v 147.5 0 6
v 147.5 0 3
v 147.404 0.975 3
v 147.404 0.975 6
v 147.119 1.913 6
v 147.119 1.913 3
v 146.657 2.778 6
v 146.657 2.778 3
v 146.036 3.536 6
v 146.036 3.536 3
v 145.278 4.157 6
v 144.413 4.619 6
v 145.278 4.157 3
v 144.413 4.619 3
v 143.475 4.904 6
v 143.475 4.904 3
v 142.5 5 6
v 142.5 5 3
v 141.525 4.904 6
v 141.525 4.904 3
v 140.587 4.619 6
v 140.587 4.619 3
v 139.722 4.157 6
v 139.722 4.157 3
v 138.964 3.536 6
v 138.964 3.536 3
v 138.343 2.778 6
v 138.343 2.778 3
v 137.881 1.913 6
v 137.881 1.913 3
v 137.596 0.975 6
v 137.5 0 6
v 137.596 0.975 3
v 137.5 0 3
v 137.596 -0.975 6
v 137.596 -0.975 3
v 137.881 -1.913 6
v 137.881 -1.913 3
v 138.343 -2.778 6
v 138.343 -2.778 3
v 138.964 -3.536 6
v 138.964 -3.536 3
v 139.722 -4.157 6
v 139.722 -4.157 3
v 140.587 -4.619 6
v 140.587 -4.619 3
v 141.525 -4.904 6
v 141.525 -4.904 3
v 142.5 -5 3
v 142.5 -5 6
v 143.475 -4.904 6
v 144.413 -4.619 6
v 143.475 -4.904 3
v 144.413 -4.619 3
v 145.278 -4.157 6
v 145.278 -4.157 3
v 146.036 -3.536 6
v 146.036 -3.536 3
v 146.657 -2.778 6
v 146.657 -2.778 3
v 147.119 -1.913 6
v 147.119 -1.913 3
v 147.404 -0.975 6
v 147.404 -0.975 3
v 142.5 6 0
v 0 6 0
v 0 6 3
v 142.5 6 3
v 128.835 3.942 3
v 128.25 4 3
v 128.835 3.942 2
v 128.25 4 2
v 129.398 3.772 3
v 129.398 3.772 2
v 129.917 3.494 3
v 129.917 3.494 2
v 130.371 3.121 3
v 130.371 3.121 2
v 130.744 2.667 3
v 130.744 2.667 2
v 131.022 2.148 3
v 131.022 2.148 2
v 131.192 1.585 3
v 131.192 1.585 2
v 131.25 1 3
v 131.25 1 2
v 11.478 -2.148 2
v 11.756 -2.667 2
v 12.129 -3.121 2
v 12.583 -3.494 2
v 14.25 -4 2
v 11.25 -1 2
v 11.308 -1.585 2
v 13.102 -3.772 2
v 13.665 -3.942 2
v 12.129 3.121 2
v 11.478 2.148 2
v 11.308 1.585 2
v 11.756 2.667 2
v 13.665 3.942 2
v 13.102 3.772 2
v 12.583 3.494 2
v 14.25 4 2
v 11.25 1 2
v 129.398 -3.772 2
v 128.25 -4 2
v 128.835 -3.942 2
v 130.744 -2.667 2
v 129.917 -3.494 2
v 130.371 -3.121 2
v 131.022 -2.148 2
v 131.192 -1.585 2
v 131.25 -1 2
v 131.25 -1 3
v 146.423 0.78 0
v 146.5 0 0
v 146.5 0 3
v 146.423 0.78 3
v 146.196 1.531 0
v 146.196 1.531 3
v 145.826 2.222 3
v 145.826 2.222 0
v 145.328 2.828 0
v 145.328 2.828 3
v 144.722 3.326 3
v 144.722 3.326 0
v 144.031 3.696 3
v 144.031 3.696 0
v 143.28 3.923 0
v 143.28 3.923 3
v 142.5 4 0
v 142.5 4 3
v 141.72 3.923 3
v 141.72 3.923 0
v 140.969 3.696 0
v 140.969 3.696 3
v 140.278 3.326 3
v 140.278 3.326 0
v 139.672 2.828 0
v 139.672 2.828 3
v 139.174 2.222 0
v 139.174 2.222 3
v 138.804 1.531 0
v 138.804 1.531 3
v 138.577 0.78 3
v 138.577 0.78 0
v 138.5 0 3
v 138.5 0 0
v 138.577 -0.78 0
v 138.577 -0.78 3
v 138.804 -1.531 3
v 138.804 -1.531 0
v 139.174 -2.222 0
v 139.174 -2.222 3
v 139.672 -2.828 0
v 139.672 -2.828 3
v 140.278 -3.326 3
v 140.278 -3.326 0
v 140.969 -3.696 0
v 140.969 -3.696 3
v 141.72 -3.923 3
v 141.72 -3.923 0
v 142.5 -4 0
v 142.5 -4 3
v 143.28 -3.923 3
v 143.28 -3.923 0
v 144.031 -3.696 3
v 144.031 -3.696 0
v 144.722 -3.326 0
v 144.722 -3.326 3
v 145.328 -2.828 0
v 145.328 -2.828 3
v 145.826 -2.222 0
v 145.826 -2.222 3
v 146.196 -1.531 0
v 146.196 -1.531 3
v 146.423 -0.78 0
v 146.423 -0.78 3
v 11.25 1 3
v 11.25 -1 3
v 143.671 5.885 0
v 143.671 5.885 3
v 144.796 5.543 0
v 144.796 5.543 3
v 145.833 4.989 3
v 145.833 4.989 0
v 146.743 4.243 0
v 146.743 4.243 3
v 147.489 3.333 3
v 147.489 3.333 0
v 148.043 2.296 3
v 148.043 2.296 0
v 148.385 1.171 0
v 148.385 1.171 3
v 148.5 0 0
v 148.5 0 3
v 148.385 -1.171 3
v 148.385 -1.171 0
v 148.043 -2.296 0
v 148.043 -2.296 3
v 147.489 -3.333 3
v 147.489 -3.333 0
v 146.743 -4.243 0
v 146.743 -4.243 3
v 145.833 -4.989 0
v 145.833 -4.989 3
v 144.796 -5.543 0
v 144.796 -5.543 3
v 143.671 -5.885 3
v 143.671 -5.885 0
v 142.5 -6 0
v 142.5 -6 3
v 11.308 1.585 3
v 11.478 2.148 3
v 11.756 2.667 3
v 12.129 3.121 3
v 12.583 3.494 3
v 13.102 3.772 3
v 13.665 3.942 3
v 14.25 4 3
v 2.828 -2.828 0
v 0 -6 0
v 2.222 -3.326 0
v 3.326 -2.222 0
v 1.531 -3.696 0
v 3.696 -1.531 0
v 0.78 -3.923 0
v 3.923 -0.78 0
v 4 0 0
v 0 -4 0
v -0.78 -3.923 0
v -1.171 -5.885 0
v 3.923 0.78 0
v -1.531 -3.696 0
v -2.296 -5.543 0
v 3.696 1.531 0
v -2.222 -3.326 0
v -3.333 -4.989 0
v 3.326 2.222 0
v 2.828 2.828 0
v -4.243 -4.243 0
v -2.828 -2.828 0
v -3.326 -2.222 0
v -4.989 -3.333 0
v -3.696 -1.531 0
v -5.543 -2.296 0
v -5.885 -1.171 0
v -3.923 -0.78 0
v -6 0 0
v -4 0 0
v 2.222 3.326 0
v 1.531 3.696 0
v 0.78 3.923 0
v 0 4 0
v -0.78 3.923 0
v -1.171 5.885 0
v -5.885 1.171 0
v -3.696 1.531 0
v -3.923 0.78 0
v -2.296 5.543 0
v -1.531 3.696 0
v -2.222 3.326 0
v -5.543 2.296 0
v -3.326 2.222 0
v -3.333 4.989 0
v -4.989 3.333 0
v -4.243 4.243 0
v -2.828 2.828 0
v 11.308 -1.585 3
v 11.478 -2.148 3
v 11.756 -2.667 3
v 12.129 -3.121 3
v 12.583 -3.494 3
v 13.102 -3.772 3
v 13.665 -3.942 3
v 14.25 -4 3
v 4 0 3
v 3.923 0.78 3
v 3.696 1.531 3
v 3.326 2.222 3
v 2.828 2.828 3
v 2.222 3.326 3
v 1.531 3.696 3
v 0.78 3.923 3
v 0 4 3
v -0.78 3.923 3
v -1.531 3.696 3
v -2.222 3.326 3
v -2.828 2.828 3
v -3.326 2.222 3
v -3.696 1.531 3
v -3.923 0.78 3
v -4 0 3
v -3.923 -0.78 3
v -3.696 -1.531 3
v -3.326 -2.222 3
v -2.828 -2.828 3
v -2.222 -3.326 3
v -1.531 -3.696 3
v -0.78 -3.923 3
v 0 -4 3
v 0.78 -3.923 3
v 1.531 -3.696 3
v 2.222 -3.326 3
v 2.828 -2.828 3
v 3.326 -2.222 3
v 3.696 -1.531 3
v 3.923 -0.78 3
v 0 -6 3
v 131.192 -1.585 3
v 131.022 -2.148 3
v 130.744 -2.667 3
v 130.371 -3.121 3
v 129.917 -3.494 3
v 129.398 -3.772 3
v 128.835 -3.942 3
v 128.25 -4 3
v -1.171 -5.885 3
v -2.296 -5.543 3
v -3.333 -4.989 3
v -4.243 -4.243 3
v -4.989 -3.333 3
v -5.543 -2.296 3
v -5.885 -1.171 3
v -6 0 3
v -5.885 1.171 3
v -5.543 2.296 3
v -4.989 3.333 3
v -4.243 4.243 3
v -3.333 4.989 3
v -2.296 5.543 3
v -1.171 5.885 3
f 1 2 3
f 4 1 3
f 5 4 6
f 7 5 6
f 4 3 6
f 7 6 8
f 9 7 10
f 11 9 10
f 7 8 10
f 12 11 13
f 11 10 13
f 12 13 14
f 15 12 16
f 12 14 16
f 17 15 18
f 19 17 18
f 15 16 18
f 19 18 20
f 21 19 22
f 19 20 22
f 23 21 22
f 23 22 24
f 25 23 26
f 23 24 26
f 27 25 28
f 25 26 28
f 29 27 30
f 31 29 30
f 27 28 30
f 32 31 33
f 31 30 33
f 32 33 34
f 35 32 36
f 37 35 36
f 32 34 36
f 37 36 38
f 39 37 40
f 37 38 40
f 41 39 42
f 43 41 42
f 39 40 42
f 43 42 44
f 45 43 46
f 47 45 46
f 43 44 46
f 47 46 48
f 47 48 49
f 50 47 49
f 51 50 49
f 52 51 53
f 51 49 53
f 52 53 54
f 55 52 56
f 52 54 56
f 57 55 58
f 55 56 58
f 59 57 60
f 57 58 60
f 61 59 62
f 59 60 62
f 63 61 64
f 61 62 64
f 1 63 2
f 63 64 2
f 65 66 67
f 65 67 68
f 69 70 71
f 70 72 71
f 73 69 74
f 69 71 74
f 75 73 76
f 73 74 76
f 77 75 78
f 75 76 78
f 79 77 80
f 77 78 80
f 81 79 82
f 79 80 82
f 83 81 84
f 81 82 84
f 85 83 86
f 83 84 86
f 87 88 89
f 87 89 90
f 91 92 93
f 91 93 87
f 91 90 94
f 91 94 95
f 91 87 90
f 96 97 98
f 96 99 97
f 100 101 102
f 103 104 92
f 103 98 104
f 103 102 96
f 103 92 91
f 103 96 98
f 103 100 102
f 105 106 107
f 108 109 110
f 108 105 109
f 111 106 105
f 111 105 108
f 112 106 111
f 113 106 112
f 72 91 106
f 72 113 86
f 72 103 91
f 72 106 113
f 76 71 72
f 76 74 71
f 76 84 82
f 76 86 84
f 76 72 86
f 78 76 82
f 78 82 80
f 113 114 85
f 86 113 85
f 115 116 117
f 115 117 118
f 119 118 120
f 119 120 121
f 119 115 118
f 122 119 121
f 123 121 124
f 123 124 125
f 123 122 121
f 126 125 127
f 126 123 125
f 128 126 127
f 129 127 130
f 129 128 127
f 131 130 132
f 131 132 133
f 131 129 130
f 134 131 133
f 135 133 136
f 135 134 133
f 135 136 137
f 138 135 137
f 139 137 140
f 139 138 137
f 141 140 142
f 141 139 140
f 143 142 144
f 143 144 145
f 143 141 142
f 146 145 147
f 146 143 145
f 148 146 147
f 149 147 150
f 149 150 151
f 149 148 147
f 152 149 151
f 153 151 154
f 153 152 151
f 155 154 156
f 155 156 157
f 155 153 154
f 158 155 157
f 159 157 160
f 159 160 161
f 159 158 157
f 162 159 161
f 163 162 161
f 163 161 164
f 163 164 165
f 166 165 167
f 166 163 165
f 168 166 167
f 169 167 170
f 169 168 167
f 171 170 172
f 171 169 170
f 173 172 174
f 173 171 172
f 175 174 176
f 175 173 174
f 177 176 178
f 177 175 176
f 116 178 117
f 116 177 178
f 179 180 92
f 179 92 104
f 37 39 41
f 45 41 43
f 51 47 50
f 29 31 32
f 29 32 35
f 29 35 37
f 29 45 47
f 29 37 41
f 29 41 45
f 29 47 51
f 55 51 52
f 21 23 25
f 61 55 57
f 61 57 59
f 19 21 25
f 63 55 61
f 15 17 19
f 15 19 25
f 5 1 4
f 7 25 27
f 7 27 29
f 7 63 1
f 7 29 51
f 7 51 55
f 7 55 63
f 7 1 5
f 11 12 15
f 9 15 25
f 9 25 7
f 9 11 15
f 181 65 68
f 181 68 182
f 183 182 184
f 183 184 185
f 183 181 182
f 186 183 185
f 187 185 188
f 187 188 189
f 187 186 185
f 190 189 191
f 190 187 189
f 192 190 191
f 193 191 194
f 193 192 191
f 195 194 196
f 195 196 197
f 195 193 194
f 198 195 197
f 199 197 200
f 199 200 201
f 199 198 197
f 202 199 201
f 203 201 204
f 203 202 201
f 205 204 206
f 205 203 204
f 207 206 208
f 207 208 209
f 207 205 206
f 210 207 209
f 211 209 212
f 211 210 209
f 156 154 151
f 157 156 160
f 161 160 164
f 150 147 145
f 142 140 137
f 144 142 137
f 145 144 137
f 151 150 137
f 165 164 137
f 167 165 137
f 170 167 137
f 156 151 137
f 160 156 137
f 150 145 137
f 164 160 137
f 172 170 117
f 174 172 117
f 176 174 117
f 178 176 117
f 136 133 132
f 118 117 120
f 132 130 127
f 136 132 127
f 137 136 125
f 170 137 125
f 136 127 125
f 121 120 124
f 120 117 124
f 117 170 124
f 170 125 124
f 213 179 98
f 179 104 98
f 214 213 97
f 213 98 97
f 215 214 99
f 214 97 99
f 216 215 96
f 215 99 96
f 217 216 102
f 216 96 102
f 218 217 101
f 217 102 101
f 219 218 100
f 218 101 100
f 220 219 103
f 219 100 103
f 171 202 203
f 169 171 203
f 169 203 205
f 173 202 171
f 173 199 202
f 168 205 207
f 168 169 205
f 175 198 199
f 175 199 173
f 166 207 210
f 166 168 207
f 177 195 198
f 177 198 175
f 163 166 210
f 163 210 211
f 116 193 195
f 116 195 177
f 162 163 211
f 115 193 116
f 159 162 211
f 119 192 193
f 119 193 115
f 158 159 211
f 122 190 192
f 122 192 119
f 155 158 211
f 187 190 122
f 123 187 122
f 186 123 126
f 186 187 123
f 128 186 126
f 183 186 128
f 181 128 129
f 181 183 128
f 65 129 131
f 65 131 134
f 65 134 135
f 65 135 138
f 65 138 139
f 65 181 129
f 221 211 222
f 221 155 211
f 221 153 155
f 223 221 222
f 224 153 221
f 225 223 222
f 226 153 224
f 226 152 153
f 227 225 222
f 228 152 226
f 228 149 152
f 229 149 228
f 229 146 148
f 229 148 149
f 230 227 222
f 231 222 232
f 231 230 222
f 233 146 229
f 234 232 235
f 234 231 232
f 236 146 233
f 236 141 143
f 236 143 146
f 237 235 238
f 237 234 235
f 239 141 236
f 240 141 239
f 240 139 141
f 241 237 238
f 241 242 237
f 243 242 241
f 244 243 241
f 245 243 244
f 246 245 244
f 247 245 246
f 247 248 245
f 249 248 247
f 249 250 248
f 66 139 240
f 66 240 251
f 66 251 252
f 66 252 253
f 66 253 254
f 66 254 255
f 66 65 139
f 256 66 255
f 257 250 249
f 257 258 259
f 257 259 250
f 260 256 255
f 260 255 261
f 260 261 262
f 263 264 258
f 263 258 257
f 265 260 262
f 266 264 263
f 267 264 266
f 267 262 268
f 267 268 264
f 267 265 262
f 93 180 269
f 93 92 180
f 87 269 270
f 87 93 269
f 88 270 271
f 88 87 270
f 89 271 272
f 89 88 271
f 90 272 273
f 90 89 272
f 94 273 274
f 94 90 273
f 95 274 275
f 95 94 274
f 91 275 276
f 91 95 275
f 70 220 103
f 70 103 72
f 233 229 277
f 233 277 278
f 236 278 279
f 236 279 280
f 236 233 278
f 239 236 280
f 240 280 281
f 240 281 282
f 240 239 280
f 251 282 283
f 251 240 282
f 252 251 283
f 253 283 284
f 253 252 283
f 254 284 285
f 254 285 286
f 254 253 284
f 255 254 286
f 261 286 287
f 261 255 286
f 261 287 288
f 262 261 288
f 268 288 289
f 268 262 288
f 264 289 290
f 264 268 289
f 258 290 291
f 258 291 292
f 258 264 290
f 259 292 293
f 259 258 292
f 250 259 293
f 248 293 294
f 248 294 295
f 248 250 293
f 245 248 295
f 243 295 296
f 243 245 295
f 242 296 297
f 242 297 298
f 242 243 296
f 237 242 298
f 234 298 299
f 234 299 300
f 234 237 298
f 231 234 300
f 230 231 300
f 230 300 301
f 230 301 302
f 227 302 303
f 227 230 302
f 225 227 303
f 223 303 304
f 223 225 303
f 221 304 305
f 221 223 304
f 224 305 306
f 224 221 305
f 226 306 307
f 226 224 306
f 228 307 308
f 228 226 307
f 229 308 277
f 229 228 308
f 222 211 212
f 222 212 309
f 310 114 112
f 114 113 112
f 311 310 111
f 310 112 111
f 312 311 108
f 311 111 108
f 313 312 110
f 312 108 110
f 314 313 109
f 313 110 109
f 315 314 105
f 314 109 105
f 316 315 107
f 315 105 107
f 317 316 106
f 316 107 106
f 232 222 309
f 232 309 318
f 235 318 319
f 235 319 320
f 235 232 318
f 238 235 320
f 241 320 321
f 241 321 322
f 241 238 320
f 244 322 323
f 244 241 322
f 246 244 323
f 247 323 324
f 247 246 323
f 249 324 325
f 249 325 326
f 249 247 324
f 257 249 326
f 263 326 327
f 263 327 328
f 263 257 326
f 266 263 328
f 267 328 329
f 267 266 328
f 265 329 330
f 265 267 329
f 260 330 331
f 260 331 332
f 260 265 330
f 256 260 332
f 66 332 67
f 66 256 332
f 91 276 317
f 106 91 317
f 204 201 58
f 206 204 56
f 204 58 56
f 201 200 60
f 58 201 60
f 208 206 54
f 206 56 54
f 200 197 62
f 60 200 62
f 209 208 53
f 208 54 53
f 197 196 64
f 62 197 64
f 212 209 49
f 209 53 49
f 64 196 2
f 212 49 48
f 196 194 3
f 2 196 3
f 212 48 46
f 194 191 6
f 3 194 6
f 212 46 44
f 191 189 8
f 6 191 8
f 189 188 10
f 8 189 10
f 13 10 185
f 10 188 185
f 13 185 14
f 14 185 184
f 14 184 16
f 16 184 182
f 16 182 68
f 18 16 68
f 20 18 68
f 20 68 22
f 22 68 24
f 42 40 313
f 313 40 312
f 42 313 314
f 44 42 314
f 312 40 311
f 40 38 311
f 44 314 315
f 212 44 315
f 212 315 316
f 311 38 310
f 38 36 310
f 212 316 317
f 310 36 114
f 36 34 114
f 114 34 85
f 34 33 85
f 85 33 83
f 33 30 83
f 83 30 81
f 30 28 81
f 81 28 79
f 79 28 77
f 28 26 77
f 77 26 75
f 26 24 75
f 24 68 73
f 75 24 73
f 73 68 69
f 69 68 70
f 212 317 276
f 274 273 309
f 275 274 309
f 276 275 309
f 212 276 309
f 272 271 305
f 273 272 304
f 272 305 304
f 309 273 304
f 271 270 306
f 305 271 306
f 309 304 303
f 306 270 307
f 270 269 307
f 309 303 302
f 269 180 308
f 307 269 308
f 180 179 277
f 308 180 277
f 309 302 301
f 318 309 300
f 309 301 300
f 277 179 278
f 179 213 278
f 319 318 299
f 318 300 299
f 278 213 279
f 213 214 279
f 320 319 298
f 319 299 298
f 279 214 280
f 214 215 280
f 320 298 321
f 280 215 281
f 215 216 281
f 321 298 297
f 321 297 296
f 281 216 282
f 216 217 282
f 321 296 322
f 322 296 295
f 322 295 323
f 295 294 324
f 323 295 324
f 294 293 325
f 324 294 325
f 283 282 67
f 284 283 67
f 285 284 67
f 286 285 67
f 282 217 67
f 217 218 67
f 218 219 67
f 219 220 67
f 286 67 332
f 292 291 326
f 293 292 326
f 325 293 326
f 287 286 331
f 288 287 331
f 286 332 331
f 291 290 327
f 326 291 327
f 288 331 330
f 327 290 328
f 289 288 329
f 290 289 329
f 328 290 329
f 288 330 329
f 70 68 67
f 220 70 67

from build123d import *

# Parameters (mm, degrees)
SKETCH1_R           = 4
BOSS_EXTRUDE1_DEPTH = 3
SKETCH3_R           = 5
BOSS_EXTRUDE2_DEPTH = 3
SKETCH4_W           = 120
SKETCH4_H           = 8
CUT_EXTRUDE1_DEPTH  = 1
FILLET1_R           = 3


with BuildPart() as part:
    # Sketch1 → Boss-Extrude1 (new body)
    with BuildSketch(Plane.XY):
        with BuildLine():
            Line((0, 6), (142.5, 6))
            ThreePointArc((142.5, 6), (148.5, 0), (142.5, -6))
            Line((142.5, -6), (0, -6))
            ThreePointArc((0, -6), (-6, 0), (0, 6))
        make_face()
        Circle(SKETCH1_R, mode=Mode.SUBTRACT)
        with Locations((142.5, 0)):
            Circle(SKETCH1_R, mode=Mode.SUBTRACT)
    extrude(amount=BOSS_EXTRUDE1_DEPTH)

    # Sketch3 → Boss-Extrude2 (add)
    with BuildSketch(Plane.XY.offset(3)):
        with Locations((142.5, 0)):
            Circle(SKETCH3_R)
    extrude(amount=BOSS_EXTRUDE2_DEPTH)

    # Sketch4 → Cut-Extrude1 (cut)
    with BuildSketch(Plane.XY.offset(3)):
        with Locations((71.25, 0)):
            Rectangle(SKETCH4_W, SKETCH4_H)
    extrude(amount=-CUT_EXTRUDE1_DEPTH, mode=Mode.SUBTRACT)

    # Fillet1
    fillet1_edges = [part.edges().sort_by_distance(p)[0] for p in [
        (131.25, 4, 2.5),
        (131.25, -4, 2.5),
        (11.25, -4, 2.5),
        (11.25, 4, 2.5),
    ]]
    fillet(fillet1_edges, radius=FILLET1_R)


solid = part.part
